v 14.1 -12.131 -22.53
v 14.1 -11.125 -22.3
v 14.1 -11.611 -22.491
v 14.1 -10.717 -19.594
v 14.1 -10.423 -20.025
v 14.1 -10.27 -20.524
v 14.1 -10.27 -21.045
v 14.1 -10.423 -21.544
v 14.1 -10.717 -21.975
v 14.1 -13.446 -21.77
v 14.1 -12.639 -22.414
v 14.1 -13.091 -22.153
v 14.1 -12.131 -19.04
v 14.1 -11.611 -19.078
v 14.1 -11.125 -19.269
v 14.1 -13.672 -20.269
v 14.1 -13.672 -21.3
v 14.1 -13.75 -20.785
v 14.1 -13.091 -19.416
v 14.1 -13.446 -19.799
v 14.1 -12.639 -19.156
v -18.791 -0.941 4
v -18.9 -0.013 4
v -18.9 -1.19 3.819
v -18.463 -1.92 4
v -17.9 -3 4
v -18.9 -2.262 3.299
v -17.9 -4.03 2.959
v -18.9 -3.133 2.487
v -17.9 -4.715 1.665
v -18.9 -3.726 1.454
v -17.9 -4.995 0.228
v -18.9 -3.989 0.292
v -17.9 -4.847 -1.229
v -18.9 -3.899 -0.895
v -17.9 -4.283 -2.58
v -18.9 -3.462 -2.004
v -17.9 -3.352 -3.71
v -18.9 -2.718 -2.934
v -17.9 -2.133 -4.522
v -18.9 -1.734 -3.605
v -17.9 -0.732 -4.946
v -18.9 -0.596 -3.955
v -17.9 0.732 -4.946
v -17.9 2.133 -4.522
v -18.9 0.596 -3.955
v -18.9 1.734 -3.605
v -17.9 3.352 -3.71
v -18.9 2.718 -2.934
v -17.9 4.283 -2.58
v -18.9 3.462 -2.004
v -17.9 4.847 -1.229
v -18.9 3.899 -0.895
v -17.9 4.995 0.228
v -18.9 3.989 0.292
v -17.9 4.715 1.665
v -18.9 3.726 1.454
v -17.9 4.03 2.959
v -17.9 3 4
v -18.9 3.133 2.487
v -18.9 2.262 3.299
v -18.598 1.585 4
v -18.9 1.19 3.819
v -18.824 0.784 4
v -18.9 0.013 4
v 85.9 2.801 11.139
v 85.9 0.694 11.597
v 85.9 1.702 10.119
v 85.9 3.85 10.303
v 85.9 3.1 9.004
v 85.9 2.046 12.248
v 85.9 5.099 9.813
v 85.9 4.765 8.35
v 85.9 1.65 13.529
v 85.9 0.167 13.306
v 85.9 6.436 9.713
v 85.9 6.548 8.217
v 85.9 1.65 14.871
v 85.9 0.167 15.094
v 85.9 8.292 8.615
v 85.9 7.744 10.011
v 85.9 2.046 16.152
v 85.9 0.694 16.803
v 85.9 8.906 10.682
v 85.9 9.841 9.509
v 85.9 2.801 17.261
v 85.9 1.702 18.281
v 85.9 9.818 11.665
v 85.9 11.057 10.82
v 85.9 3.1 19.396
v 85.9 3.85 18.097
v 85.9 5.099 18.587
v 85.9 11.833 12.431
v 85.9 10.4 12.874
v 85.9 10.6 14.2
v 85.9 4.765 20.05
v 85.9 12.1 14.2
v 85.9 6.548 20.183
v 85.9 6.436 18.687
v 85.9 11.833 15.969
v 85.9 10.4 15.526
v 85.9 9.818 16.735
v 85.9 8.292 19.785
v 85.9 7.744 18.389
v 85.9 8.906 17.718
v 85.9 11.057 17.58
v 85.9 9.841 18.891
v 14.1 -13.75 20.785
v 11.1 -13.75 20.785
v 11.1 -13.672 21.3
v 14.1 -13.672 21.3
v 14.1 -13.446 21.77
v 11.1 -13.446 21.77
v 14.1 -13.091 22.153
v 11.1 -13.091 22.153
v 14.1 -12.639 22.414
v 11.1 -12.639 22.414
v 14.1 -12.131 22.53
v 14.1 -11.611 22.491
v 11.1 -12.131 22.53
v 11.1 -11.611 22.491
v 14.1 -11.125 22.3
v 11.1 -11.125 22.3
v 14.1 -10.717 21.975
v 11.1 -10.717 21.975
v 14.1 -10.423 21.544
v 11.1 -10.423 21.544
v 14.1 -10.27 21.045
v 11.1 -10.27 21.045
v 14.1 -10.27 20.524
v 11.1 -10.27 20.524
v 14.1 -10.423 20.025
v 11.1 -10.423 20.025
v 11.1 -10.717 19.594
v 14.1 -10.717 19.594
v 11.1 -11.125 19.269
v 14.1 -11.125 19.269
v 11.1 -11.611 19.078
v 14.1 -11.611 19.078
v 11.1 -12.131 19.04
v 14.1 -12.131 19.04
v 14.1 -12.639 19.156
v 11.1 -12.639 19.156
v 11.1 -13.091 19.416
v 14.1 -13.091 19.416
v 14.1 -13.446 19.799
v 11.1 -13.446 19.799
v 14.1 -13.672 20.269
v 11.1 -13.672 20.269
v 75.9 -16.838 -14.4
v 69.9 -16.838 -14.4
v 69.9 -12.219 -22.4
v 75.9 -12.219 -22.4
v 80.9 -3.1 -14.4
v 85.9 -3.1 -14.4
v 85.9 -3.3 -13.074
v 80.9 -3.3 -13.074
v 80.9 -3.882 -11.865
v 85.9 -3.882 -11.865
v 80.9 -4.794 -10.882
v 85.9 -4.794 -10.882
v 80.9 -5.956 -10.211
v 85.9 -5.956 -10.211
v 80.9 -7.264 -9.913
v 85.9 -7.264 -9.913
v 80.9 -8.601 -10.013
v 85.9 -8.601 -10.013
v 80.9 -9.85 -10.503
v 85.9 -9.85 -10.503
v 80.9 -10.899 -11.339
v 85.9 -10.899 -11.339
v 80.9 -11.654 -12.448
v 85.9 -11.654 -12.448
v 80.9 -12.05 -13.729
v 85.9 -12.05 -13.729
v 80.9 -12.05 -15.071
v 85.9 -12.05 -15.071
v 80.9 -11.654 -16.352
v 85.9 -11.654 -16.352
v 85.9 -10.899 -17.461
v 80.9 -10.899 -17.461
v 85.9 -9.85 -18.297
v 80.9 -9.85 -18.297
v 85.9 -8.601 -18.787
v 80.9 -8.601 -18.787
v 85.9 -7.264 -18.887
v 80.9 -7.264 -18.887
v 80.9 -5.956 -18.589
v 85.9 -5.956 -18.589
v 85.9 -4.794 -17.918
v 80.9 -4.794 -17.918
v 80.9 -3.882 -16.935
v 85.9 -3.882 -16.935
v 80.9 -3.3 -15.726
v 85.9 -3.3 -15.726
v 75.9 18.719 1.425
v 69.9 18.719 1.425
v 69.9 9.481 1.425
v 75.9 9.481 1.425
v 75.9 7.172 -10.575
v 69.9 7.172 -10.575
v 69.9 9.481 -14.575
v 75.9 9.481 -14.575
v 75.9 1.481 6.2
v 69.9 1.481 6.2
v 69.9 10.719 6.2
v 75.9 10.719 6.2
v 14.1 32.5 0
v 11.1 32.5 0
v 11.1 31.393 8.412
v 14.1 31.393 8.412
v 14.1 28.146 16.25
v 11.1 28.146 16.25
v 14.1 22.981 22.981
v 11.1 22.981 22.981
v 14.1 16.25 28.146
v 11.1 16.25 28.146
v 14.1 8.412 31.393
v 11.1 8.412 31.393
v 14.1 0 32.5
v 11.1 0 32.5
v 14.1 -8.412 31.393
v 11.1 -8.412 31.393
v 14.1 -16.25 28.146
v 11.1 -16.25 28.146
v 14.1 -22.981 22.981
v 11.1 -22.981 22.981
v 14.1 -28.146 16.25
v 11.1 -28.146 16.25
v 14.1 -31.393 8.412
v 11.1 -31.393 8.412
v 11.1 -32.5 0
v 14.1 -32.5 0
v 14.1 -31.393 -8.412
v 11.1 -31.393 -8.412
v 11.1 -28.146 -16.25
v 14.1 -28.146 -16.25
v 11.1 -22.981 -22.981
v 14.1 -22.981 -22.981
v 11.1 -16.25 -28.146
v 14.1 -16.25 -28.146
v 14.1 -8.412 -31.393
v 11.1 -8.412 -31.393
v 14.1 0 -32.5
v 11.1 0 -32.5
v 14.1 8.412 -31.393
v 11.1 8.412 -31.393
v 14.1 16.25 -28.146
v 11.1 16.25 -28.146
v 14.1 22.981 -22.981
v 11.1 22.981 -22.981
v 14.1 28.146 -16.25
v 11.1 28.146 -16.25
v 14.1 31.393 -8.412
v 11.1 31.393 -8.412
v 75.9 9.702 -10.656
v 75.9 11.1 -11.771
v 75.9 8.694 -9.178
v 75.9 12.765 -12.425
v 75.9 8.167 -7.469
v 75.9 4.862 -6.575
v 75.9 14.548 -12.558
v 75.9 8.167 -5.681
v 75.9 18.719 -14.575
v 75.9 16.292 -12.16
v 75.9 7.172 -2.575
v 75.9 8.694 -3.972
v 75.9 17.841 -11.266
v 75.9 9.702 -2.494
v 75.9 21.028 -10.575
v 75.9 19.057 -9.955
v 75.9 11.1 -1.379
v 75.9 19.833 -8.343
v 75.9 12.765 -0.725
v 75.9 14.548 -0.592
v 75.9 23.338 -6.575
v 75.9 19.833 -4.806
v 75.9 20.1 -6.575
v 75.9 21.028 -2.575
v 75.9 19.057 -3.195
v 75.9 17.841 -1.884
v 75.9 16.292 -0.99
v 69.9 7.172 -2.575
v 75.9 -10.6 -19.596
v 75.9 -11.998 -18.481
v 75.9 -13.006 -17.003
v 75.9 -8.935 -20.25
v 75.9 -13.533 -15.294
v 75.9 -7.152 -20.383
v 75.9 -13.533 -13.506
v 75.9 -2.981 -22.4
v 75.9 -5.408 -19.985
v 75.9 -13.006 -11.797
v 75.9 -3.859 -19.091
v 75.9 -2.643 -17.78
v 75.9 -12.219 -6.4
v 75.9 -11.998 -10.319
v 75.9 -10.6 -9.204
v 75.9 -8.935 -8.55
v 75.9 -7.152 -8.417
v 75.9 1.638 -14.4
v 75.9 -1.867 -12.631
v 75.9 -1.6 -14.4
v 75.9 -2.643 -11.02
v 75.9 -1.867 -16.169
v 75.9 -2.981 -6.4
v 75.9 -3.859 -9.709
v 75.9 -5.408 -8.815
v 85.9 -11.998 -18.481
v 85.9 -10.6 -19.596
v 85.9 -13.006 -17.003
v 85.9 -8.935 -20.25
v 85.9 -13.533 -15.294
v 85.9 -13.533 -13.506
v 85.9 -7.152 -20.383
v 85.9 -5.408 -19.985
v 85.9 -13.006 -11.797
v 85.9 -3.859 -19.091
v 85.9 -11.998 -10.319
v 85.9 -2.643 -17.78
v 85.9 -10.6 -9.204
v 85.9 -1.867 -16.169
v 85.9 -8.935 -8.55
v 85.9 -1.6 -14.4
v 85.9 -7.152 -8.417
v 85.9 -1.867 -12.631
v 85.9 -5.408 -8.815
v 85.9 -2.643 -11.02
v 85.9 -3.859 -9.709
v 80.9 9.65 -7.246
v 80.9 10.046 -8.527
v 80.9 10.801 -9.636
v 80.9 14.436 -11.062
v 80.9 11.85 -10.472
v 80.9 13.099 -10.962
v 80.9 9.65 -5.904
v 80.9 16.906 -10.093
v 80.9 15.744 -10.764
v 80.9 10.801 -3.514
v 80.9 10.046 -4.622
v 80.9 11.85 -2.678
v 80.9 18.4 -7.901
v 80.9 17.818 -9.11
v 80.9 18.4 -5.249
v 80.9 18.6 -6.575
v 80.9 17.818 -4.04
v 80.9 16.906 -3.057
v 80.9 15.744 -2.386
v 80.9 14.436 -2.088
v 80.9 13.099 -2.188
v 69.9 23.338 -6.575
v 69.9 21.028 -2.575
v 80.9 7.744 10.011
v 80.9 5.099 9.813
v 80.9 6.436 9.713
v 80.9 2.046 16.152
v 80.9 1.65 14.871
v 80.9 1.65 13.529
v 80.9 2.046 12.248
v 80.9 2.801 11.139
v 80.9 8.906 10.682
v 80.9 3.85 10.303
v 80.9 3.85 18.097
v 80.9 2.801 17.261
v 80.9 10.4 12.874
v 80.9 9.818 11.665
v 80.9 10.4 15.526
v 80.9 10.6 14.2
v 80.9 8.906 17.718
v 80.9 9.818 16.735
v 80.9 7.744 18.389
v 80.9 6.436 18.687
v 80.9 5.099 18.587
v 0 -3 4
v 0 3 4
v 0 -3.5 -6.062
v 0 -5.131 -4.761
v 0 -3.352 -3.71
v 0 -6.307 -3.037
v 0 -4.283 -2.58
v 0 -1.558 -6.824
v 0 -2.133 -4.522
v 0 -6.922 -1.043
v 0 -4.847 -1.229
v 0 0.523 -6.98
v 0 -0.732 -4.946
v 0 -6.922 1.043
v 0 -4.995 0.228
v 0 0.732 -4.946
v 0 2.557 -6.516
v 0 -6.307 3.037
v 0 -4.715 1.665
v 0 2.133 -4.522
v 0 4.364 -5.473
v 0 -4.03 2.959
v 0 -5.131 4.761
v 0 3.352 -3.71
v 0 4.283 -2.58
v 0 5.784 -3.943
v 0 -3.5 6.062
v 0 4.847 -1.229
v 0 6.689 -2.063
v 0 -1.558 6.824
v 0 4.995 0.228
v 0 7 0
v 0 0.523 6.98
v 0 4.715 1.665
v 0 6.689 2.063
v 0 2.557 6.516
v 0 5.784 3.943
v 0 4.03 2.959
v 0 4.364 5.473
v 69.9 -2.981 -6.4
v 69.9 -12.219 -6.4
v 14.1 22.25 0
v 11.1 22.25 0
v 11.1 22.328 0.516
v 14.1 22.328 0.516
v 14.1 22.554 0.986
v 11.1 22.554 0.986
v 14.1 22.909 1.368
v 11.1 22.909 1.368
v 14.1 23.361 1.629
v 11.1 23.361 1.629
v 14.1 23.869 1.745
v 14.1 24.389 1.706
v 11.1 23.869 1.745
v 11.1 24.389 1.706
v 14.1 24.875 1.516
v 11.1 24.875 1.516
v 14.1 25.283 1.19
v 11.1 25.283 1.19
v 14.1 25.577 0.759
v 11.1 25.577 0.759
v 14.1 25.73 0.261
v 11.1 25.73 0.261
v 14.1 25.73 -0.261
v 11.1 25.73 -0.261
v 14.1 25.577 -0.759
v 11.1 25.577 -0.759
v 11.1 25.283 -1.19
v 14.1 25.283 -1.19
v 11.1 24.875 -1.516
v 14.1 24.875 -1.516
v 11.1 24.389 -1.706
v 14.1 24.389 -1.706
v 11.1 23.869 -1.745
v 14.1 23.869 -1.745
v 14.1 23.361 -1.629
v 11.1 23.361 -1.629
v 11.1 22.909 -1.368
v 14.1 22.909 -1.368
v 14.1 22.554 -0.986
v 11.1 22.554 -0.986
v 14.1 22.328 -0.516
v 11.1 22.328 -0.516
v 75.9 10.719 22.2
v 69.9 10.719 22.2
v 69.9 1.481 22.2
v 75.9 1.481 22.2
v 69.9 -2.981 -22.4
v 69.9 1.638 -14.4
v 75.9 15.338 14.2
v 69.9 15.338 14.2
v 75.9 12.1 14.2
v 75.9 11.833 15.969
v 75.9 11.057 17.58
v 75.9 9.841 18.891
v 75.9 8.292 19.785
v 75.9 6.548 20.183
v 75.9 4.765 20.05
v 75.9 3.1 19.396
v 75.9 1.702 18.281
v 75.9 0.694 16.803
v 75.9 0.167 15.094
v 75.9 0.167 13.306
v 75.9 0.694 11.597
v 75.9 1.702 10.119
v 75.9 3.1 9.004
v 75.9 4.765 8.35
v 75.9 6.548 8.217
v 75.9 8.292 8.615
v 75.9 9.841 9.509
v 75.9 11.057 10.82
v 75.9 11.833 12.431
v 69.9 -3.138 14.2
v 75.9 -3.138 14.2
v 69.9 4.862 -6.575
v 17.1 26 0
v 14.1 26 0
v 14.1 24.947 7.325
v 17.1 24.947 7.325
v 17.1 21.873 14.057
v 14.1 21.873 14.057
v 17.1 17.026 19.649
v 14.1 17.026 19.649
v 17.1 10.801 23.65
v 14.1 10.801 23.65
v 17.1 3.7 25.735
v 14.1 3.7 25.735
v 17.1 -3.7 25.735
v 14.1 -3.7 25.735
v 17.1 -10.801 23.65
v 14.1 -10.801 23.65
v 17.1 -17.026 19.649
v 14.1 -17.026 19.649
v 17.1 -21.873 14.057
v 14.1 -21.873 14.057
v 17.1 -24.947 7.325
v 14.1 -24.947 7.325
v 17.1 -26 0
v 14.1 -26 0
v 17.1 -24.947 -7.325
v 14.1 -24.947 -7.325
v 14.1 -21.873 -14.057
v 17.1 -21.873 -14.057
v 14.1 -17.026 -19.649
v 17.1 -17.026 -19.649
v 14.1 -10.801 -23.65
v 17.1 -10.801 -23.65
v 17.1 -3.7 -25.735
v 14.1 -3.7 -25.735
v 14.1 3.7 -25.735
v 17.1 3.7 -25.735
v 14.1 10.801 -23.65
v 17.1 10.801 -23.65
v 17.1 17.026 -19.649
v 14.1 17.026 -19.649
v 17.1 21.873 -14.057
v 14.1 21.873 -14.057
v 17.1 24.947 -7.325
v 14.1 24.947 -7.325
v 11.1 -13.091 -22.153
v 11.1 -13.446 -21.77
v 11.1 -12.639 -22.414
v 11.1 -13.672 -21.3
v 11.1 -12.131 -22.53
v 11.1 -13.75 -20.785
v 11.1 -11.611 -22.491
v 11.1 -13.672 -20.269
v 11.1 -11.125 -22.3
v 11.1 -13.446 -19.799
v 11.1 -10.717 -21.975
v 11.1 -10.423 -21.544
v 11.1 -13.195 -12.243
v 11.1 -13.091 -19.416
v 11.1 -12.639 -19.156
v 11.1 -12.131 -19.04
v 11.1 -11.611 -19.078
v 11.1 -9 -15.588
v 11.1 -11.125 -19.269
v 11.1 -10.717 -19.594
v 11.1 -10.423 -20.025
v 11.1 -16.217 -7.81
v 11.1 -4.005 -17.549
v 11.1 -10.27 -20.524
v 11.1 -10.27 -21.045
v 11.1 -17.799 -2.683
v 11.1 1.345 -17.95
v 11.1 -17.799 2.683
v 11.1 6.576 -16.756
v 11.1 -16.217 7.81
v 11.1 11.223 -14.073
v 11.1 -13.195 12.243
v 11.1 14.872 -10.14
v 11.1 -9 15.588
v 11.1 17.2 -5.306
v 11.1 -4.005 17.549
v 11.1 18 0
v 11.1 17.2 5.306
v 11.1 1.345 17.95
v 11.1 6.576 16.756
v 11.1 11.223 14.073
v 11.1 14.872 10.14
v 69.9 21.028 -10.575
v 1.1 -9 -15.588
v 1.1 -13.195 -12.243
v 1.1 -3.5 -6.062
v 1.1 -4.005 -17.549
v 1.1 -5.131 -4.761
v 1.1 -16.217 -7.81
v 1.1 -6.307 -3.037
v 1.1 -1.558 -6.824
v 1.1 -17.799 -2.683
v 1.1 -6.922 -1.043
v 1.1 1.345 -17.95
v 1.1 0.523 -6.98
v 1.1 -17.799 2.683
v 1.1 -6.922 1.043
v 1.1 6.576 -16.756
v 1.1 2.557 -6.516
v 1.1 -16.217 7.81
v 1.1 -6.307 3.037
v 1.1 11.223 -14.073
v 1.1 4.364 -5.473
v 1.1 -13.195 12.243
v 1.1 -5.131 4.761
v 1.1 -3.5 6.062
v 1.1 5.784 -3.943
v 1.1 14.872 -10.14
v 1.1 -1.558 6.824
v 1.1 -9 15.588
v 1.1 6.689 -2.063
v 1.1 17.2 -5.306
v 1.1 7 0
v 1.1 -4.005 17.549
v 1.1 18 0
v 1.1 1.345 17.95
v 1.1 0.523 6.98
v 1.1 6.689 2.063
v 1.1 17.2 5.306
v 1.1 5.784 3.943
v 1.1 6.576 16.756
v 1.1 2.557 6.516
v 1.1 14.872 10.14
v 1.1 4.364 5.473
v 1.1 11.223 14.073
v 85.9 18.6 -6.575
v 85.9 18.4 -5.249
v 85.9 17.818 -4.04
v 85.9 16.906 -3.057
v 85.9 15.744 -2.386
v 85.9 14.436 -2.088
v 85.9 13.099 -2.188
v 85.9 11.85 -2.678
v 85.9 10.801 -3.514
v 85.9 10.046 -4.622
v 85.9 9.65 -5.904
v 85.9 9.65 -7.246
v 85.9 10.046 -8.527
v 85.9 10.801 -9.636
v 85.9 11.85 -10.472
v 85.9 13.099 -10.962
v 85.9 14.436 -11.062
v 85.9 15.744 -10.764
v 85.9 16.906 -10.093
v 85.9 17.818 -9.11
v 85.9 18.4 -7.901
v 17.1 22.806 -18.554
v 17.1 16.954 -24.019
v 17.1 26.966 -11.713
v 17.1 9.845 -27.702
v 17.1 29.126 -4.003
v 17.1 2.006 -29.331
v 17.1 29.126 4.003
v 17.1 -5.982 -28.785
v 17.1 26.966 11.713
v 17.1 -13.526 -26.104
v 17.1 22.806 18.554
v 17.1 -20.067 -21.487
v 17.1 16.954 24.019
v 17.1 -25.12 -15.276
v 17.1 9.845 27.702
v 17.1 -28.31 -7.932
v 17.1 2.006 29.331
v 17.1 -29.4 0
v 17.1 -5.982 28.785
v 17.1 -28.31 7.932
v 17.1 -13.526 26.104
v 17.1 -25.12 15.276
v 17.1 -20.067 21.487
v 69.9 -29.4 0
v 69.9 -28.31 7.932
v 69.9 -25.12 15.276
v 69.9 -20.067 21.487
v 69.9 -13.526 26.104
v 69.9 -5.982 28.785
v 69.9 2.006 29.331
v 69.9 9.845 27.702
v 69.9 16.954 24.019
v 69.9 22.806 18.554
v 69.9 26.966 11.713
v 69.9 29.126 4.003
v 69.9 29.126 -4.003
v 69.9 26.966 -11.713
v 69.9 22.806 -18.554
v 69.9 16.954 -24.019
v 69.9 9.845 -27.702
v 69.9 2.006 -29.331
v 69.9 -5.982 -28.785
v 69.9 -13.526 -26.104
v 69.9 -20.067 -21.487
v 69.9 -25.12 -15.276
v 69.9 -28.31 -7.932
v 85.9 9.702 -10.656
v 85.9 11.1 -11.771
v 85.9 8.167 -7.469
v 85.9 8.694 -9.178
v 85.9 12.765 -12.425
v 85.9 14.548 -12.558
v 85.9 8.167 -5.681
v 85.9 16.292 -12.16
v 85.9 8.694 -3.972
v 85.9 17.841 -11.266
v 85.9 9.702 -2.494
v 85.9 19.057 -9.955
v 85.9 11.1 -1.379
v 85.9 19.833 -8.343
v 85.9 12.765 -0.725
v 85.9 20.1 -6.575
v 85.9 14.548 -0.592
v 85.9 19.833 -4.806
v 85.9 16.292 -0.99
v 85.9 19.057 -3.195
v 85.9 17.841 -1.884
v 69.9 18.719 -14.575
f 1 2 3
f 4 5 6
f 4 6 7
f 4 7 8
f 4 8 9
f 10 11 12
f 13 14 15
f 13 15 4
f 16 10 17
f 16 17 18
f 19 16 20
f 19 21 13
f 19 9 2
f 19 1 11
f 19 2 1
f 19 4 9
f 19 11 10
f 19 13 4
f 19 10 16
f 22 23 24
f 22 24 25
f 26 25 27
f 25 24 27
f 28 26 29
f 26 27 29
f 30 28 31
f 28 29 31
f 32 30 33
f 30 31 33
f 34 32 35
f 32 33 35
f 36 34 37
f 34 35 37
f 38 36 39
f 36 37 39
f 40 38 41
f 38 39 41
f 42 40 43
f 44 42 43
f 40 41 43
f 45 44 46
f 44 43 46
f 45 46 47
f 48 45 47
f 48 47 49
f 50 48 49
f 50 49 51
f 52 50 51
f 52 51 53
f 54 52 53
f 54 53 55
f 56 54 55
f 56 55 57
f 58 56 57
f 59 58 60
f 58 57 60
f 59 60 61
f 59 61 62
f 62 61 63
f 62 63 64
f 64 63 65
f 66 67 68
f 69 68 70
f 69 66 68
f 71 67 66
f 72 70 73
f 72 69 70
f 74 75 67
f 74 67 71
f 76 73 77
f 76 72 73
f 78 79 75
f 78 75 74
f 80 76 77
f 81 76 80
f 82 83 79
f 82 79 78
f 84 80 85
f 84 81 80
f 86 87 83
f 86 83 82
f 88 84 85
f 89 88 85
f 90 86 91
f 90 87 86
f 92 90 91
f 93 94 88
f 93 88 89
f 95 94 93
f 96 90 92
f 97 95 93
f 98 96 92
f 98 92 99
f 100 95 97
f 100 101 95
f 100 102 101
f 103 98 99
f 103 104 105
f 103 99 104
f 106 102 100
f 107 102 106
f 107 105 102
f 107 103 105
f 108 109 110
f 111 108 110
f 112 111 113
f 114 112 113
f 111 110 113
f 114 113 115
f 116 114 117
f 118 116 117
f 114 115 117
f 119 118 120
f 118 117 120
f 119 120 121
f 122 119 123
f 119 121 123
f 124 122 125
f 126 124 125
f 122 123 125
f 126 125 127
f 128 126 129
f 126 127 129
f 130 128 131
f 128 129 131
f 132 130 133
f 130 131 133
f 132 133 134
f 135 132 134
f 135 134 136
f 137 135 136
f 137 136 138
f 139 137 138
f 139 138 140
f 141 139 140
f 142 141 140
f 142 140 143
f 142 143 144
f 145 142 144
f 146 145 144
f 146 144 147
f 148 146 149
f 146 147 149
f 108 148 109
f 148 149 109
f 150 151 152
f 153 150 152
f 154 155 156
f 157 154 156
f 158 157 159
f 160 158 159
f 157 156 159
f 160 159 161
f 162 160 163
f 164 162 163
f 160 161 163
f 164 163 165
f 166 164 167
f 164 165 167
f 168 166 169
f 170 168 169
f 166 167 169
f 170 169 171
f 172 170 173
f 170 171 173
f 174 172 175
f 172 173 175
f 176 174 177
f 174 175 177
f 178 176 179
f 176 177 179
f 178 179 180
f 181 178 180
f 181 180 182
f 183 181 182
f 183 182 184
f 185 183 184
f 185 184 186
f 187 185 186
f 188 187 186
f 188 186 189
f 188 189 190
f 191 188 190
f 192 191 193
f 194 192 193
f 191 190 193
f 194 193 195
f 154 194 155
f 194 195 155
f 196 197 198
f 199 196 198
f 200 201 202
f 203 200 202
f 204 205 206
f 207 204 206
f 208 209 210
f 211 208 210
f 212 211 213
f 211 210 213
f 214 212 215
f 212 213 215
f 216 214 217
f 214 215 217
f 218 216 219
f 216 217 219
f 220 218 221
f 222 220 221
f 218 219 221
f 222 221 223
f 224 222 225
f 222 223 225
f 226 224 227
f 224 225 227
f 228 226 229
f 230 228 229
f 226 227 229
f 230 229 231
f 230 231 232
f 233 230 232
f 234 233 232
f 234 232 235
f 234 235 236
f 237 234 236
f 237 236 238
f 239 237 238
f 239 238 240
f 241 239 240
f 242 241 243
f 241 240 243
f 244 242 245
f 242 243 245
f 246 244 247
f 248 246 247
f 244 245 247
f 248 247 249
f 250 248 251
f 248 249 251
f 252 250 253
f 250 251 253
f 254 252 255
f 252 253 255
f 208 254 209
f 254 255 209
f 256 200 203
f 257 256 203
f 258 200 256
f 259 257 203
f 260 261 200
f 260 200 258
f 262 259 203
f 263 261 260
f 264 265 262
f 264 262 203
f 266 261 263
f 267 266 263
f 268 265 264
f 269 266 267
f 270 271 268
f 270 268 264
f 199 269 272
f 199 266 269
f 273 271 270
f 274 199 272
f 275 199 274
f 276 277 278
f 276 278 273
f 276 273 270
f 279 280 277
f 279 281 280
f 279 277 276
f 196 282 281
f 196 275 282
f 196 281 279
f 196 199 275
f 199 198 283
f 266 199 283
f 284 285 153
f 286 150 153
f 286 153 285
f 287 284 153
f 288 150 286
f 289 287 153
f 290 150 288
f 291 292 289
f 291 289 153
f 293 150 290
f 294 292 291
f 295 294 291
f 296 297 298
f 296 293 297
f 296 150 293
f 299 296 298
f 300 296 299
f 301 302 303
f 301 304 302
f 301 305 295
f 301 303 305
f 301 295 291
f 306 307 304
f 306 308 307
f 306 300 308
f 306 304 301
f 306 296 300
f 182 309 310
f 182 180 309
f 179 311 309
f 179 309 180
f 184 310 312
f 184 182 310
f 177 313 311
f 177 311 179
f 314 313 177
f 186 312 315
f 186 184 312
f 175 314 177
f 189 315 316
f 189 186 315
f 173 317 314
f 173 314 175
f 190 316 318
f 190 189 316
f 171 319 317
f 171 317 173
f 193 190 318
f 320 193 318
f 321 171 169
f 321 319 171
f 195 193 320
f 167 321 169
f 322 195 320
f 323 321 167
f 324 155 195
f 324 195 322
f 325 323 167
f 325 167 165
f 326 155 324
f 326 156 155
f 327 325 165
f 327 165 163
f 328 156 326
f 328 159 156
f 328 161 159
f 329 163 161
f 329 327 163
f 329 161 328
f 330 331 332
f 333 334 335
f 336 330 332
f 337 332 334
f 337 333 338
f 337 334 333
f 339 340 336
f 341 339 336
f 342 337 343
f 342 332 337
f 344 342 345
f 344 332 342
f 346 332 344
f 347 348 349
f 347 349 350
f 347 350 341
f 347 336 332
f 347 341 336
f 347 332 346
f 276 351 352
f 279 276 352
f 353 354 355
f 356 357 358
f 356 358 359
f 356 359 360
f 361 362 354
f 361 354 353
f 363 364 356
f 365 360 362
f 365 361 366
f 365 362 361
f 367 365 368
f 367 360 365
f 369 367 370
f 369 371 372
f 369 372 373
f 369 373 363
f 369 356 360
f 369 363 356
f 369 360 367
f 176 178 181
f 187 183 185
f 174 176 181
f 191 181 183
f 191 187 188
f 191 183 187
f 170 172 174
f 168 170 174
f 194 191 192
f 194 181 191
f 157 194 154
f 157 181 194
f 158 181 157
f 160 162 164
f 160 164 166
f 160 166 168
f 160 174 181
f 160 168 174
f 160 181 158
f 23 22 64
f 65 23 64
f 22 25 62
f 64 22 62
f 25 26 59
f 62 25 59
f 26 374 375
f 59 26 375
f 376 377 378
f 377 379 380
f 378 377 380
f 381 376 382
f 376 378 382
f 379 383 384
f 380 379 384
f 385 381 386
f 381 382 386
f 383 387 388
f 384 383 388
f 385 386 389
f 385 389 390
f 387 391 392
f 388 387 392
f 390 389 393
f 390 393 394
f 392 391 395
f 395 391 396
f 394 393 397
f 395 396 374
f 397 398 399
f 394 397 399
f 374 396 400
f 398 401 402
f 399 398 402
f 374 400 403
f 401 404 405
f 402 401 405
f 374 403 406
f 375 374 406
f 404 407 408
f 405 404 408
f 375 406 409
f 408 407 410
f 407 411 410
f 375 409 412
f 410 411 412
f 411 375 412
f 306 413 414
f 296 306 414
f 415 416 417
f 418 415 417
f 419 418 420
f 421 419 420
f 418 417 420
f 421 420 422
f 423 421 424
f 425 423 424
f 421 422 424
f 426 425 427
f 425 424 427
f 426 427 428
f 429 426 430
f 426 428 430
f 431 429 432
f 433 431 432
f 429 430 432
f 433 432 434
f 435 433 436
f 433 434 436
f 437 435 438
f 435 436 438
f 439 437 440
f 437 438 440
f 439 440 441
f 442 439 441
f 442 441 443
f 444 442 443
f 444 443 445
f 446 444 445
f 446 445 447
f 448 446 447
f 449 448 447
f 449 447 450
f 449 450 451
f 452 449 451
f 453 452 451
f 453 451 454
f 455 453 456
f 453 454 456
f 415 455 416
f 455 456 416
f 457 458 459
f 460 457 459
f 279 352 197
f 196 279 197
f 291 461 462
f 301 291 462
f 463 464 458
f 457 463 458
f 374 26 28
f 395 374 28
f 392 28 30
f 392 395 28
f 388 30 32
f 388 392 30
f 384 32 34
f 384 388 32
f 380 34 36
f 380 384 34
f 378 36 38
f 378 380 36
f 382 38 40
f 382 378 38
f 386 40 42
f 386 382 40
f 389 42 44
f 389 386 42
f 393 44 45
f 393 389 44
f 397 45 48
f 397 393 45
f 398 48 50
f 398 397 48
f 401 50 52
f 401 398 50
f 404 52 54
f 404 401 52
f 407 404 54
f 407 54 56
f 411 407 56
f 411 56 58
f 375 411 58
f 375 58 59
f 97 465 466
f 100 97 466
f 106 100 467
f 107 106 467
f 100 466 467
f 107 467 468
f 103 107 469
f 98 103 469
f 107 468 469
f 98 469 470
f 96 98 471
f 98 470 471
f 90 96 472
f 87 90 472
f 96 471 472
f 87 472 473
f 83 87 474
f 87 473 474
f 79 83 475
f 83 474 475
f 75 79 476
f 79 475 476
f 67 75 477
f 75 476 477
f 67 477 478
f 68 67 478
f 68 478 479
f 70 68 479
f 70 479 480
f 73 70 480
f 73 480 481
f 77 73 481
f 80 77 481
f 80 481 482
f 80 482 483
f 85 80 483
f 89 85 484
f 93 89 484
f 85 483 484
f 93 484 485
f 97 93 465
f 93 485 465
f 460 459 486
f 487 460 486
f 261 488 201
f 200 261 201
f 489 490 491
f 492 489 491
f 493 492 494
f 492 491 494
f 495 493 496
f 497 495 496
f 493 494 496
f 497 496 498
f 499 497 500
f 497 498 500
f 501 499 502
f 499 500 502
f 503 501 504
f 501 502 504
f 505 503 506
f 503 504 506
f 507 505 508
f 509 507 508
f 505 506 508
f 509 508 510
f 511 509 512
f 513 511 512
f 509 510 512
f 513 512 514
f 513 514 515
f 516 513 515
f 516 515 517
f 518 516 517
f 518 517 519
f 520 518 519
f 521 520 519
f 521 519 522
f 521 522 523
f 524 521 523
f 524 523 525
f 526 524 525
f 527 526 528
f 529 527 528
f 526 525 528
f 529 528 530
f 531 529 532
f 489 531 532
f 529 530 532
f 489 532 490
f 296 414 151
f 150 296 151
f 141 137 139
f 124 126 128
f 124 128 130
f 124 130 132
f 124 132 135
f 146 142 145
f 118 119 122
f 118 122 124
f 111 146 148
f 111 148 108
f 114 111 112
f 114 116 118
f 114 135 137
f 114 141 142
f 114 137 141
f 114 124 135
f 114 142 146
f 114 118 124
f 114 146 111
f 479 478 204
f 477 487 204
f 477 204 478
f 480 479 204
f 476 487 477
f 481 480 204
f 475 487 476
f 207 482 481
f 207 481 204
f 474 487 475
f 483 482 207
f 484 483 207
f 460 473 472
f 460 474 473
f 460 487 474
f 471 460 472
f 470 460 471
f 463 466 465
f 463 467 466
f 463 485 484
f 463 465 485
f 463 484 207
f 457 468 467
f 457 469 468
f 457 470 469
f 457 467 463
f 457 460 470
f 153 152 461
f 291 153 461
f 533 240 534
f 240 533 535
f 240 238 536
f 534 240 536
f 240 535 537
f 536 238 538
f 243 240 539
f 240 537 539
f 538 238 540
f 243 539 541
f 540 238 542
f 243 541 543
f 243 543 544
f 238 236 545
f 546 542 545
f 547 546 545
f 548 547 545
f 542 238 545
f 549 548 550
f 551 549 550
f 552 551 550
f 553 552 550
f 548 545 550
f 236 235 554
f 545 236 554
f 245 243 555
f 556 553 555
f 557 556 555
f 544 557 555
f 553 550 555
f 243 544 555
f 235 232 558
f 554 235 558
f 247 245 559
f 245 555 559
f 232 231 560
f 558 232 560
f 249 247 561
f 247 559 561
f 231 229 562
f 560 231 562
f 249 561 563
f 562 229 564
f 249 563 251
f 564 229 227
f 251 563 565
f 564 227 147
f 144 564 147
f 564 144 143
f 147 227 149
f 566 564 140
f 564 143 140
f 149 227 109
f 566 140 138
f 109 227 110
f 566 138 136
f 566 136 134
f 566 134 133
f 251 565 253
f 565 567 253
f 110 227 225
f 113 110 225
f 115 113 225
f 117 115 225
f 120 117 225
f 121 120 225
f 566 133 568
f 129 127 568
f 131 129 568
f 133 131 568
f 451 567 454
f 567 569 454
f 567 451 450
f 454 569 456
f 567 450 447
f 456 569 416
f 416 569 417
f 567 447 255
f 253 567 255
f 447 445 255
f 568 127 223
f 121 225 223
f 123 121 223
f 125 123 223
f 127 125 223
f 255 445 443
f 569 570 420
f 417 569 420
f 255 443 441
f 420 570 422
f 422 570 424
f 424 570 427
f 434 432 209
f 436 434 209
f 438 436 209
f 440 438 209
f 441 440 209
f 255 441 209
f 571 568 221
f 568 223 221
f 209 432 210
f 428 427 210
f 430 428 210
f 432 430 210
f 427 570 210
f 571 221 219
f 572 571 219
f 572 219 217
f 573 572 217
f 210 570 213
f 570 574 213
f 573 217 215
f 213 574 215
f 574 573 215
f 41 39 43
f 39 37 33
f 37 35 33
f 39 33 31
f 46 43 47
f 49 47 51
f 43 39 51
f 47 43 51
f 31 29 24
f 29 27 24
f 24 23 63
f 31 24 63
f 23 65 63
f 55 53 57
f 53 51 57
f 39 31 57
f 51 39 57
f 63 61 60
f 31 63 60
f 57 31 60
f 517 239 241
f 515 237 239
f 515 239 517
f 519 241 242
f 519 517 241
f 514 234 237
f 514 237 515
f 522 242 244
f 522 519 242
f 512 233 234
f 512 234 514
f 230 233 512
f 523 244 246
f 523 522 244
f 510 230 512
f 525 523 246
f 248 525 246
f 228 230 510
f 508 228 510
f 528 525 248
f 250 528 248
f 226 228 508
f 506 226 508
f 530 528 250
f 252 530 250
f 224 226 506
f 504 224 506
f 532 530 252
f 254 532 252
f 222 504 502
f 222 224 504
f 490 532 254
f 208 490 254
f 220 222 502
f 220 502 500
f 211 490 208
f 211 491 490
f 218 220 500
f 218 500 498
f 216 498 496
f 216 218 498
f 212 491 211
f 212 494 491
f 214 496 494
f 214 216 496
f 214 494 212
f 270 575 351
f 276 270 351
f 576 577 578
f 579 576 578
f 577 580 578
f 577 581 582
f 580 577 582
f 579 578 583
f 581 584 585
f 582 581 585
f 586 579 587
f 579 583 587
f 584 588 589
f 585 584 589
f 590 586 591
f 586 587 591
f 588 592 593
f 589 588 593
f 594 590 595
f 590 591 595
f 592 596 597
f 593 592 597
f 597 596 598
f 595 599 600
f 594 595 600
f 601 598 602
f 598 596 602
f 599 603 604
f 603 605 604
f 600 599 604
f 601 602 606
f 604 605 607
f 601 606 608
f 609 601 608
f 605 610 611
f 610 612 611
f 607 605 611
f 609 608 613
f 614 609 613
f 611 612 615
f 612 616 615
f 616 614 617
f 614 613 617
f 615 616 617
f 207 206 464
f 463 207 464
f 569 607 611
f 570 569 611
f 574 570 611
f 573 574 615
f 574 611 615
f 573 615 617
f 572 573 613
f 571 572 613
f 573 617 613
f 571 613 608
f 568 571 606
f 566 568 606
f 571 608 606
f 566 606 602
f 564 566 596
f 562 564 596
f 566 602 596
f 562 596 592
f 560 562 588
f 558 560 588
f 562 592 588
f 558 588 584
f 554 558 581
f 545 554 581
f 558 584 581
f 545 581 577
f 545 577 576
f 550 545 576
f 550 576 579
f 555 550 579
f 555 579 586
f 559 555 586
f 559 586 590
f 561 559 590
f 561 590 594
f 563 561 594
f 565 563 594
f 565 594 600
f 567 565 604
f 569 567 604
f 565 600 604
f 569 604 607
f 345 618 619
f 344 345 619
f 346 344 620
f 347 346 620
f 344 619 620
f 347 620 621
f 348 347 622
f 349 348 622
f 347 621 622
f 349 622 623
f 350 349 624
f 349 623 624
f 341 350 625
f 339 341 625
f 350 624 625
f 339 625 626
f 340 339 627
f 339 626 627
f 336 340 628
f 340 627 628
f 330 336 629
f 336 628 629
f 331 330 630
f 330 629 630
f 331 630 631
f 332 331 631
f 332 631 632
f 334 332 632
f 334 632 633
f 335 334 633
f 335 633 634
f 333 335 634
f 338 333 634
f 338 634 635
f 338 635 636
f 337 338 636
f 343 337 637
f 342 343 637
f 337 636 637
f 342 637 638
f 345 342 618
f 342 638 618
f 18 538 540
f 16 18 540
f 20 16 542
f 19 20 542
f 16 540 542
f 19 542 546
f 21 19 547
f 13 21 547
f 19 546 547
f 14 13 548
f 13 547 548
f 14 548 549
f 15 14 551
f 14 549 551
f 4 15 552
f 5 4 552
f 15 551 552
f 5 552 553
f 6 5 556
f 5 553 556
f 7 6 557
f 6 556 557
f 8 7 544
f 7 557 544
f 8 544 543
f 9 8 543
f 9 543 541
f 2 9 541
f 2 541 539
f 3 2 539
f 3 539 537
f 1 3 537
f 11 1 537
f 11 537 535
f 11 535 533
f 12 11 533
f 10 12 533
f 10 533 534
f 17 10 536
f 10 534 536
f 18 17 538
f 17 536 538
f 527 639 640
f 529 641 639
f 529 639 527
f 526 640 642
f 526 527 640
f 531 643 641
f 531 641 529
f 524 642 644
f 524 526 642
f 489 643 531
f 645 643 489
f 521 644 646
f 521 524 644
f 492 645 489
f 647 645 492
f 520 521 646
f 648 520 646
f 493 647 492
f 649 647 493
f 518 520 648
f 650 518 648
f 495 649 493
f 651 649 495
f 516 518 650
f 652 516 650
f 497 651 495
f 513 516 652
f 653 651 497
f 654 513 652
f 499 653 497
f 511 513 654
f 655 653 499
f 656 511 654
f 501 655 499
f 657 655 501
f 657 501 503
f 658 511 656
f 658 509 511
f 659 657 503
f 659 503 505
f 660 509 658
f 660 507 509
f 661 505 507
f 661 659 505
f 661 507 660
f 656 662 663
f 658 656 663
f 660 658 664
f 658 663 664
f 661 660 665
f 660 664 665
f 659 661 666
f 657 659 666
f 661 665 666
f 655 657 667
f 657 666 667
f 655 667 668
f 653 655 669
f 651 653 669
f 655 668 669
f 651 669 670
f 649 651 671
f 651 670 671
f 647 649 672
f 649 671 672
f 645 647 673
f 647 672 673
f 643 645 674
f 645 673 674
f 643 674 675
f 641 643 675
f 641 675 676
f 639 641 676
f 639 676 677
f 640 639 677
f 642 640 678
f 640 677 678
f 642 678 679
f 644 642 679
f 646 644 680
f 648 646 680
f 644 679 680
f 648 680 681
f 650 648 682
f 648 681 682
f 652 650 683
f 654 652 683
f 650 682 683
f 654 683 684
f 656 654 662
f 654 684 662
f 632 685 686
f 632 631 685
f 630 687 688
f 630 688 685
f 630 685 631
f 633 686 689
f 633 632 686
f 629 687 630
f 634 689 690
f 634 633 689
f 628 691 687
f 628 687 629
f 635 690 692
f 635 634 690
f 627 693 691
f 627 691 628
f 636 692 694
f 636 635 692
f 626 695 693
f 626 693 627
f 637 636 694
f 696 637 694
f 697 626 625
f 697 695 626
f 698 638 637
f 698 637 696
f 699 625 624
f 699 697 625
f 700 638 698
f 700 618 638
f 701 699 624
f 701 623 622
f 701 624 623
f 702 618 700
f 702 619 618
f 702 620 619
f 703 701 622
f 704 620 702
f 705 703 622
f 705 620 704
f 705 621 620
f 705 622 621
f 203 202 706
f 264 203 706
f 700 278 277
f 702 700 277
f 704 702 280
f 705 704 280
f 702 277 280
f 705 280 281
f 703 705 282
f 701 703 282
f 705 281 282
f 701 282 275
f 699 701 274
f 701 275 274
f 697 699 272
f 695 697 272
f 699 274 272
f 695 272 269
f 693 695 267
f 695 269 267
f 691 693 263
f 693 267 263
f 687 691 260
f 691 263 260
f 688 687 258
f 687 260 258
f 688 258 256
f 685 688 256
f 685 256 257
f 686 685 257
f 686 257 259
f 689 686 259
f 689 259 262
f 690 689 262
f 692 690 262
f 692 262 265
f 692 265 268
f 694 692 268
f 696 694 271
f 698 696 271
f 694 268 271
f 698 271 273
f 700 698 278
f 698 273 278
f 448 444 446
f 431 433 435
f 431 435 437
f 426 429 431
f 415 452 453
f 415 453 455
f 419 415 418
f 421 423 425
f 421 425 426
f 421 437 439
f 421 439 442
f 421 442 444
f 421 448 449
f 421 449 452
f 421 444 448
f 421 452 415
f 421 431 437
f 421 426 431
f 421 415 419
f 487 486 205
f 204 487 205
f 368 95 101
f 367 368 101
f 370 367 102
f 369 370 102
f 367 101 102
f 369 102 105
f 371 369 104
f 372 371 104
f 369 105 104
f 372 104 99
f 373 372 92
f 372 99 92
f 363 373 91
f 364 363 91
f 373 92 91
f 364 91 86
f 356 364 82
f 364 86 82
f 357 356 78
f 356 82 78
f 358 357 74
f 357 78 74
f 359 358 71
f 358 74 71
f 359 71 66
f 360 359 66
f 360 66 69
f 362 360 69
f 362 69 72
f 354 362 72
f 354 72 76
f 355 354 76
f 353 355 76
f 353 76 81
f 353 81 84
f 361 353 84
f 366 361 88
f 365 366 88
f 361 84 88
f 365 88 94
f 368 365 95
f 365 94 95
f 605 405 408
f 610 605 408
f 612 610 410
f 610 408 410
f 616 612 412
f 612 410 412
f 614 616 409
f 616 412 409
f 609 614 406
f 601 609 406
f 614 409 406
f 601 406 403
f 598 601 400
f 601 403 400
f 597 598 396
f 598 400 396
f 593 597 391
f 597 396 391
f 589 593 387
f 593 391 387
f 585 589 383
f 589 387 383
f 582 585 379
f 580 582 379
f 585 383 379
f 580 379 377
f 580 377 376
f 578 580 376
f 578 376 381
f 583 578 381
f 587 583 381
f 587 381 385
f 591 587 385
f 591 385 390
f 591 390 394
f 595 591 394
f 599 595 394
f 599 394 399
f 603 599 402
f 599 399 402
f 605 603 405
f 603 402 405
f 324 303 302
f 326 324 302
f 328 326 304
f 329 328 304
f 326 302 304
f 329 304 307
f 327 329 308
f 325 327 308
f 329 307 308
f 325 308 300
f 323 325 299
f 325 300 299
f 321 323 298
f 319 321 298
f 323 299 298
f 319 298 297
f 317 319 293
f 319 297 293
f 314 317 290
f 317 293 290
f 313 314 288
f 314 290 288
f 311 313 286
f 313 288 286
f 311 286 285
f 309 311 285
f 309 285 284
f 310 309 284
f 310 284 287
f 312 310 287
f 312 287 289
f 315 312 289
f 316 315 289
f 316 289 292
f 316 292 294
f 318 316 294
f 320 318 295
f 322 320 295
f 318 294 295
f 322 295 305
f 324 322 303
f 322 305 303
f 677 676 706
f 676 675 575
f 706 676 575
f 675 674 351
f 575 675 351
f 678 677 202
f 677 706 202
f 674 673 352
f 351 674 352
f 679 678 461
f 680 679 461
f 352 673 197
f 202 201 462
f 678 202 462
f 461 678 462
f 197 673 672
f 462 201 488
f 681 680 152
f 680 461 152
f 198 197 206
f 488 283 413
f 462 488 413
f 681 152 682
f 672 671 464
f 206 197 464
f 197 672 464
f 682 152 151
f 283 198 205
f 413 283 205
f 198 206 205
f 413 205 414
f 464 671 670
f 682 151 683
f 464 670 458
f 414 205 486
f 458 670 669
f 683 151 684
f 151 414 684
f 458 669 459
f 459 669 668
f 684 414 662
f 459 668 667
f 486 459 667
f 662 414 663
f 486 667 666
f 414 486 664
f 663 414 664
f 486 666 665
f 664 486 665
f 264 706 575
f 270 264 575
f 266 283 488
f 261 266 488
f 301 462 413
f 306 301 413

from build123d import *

# Parameters (mm, degrees)
F0_R        = 5
F1_DEPTH    = 18.9
F2_W        = 21.1690347642
F2_H        = 4.931249544
F3_DEPTH    = 18.901
F4_T2_ANGLE = 359.64
F5_R        = 7
F6_DEPTH    = 1.1
F7_R        = 18
F8_DEPTH    = 10
F9_R        = 32.5
F10_DEPTH   = 3
F11_R       = 26
F12_DEPTH   = 3
F14_R       = 29.4
F15_DEPTH   = 52.8
F16_R       = 1.75
F17_DEPTH   = 3
F19_DEPTH   = 6
F20_R       = 6
F21_DEPTH   = 10
F22_R       = 4.5
F23_DEPTH   = 5


# Not quite as in the source:
# - a fillet or chamfer that OpenCascade refuses, or shapes differently, is made with other operations: its cross-section is extruded or revolved along the edge and cut away or added


with BuildPart() as f1:
    # F0 (on Right) → F1 (new body)
    with BuildSketch(Plane.YZ):
        Circle(F0_R)
    extrude(amount=-F1_DEPTH)

    # F2 (on Right) → F3 (cut, through all)
    with BuildSketch(Plane.YZ):
        with Locations((0.0764410943, 6.465624772)):
            Rectangle(F2_W, F2_H)
    extrude(amount=-F3_DEPTH, mode=Mode.SUBTRACT)

    # F4: chamfer of 1 on 1 edges, made by hand

    # F4_s1 → F4_t2 (revolve, cut)
    with BuildSketch(Plane(origin=(0, 0, 0), x_dir=(1, 0, 0), z_dir=(0, 0.9999950652, 0.0031415875))):
        with BuildLine():
            Line((-17.8717157288, -5.0282842712), (-18.9282842712, -3.9717157288))
            Line((-18.9282842712, -3.9717157288), (-18.9482842712, -3.9717157288))
            ThreePointArc((-18.9482842712, -3.9717157288), (-18.92, -4.4858578644), (-18.92, -5))
            Line((-18.92, -5), (-18.9, -5.02))
            ThreePointArc((-18.9, -5.02), (-18.3858578644, -5.02), (-17.8717157288, -5.0482842712))
            Line((-17.8717157288, -5.0482842712), (-17.8717157288, -5.0282842712))
        make_face()
    revolve(axis=Axis((-18.9, 0, 0), (1, 0, 0)), revolution_arc=F4_T2_ANGLE, mode=Mode.SUBTRACT)

    # F5 (on face) → F6 (join)
    with BuildSketch(Plane.YZ):
        Circle(F5_R)
    extrude(amount=F6_DEPTH)

    # F7 (on face) → F8 (join)
    with BuildSketch(Plane.YZ.offset(1.1)):
        Circle(F7_R)
    extrude(amount=F8_DEPTH)

    # F9 (on face) → F10 (join)
    with BuildSketch(Plane.YZ.offset(11.1)):
        Circle(F9_R)
    extrude(amount=F10_DEPTH)

    # F11 (on face) → F12 (join)
    with BuildSketch(Plane.YZ.offset(14.1)):
        Circle(F11_R)
    extrude(amount=F12_DEPTH)

    # F14 (on offset) → F15 (join, through all)
    with BuildSketch(Plane(origin=(69.9, 0, 0), x_dir=(0, -1, 0), z_dir=(-1, 0, 0))):
        Circle(F14_R)
    extrude(amount=F15_DEPTH)

    # F16 (on face) → F17 (cut)
    with BuildSketch(Plane(origin=(11.1, 0, 0), x_dir=(0, -1, 0), z_dir=(-1, 0, 0))):
        with Locations((-24, 0)):
            Circle(F16_R)
        with Locations((12, -20.7846096908)):
            Circle(F16_R)
        with Locations((12, 20.7846096908)):
            Circle(F16_R)
    extrude(amount=-F17_DEPTH, mode=Mode.SUBTRACT)

    # F18 (on face) → F19 (join)
    with BuildSketch(Plane.YZ.offset(69.9)):
        with BuildLine():
            ThreePointArc((21.0282031968, -10.574938038), (21.8274066017, -8.6454903731), (22.1, -6.57493798))
            ThreePointArc((22.1, -6.57493798), (21.8274066078, -4.5043856099), (21.0282032207, -2.5749379634))
            ThreePointArc((21.0282032207, -2.5749379634), (18.0999999917, 0.3532652551), (14.1, 1.42506202))
            ThreePointArc((14.1, 1.42506202), (10.1000001451, 0.3532653341), (7.1717969373, -2.5749376897))
            ThreePointArc((7.1717969373, -2.5749376897), (6.1, -6.5749379695), (7.1717969269, -10.5749382522))
            ThreePointArc((7.1717969269, -10.5749382522), (10.1000001361, -13.5031412888), (14.1, -14.57493798))
            ThreePointArc((14.1, -14.57493798), (18.099999971, -13.503141227), (21.0282031968, -10.574938038))
        make_face()
        with BuildLine():
            ThreePointArc((21.0282032207, -2.5749379634), (21.8274066078, -4.5043856099), (22.1, -6.57493798))
            ThreePointArc((22.1, -6.57493798), (21.8274066017, -8.6454903731), (21.0282031968, -10.574938038))
            Line((21.0282031968, -10.574938038), (23.337604307, -6.57493798))
            Line((23.337604307, -6.57493798), (21.0282032207, -2.5749379634))
        make_face()
        with BuildLine():
            ThreePointArc((14.1, 1.42506202), (18.0999999917, 0.3532652551), (21.0282032207, -2.5749379634))
            Line((21.0282032207, -2.5749379634), (18.7188021535, 1.42506202))
            Line((18.7188021535, 1.42506202), (14.1, 1.42506202))
        make_face()
        with BuildLine():
            Line((18.7188021535, -14.57493798), (21.0282031968, -10.574938038))
            ThreePointArc((21.0282031968, -10.574938038), (18.099999971, -13.503141227), (14.1, -14.57493798))
            Line((14.1, -14.57493798), (18.7188021535, -14.57493798))
        make_face()
        with BuildLine():
            ThreePointArc((7.1717969373, -2.5749376897), (10.1000001451, 0.3532653341), (14.1, 1.42506202))
            Line((14.1, 1.42506202), (9.4811978465, 1.42506202))
            Line((9.4811978465, 1.42506202), (7.1717969373, -2.5749376897))
        make_face()
        with BuildLine():
            Line((9.4811978465, -14.57493798), (14.1, -14.57493798))
            ThreePointArc((14.1, -14.57493798), (10.1000001361, -13.5031412888), (7.1717969269, -10.5749382522))
            Line((7.1717969269, -10.5749382522), (9.4811978465, -14.57493798))
        make_face()
        with BuildLine():
            ThreePointArc((7.1717969269, -10.5749382522), (6.1, -6.5749379695), (7.1717969373, -2.5749376897))
            Line((7.1717969373, -2.5749376897), (4.862395693, -6.57493798))
            Line((4.862395693, -6.57493798), (7.1717969269, -10.5749382522))
        make_face()
        Polygon((10.7188021535, 22.2), (1.4811978465, 22.2), (-3.137604307, 14.2), (1.4811978465, 6.2), (10.7188021535, 6.2), (15.337604307, 14.2), align=None)
        Polygon((-2.9811978465, -6.4), (-12.2188021535, -6.4), (-16.837604307, -14.4), (-12.2188021535, -22.4), (-2.9811978465, -22.4), (1.637604307, -14.4), align=None)
    extrude(amount=F19_DEPTH)

    # F20 (on face) → F21 (join)
    with BuildSketch(Plane.YZ.offset(75.9)):
        with Locations((6.1, 14.2)):
            Circle(F20_R)
        with Locations((14.1, -6.57493798)):
            Circle(F20_R)
        with Locations((-7.6, -14.4)):
            Circle(F20_R)
    extrude(amount=F21_DEPTH)

    # F22 (on face) → F23 (cut)
    with BuildSketch(Plane.YZ.offset(85.9)):
        with Locations((6.1, 14.2)):
            Circle(F22_R)
        with Locations((-7.6, -14.4)):
            Circle(F22_R)
        with Locations((14.1, -6.57493798)):
            Circle(F22_R)
    extrude(amount=-F23_DEPTH, mode=Mode.SUBTRACT)


solid = f1.part
